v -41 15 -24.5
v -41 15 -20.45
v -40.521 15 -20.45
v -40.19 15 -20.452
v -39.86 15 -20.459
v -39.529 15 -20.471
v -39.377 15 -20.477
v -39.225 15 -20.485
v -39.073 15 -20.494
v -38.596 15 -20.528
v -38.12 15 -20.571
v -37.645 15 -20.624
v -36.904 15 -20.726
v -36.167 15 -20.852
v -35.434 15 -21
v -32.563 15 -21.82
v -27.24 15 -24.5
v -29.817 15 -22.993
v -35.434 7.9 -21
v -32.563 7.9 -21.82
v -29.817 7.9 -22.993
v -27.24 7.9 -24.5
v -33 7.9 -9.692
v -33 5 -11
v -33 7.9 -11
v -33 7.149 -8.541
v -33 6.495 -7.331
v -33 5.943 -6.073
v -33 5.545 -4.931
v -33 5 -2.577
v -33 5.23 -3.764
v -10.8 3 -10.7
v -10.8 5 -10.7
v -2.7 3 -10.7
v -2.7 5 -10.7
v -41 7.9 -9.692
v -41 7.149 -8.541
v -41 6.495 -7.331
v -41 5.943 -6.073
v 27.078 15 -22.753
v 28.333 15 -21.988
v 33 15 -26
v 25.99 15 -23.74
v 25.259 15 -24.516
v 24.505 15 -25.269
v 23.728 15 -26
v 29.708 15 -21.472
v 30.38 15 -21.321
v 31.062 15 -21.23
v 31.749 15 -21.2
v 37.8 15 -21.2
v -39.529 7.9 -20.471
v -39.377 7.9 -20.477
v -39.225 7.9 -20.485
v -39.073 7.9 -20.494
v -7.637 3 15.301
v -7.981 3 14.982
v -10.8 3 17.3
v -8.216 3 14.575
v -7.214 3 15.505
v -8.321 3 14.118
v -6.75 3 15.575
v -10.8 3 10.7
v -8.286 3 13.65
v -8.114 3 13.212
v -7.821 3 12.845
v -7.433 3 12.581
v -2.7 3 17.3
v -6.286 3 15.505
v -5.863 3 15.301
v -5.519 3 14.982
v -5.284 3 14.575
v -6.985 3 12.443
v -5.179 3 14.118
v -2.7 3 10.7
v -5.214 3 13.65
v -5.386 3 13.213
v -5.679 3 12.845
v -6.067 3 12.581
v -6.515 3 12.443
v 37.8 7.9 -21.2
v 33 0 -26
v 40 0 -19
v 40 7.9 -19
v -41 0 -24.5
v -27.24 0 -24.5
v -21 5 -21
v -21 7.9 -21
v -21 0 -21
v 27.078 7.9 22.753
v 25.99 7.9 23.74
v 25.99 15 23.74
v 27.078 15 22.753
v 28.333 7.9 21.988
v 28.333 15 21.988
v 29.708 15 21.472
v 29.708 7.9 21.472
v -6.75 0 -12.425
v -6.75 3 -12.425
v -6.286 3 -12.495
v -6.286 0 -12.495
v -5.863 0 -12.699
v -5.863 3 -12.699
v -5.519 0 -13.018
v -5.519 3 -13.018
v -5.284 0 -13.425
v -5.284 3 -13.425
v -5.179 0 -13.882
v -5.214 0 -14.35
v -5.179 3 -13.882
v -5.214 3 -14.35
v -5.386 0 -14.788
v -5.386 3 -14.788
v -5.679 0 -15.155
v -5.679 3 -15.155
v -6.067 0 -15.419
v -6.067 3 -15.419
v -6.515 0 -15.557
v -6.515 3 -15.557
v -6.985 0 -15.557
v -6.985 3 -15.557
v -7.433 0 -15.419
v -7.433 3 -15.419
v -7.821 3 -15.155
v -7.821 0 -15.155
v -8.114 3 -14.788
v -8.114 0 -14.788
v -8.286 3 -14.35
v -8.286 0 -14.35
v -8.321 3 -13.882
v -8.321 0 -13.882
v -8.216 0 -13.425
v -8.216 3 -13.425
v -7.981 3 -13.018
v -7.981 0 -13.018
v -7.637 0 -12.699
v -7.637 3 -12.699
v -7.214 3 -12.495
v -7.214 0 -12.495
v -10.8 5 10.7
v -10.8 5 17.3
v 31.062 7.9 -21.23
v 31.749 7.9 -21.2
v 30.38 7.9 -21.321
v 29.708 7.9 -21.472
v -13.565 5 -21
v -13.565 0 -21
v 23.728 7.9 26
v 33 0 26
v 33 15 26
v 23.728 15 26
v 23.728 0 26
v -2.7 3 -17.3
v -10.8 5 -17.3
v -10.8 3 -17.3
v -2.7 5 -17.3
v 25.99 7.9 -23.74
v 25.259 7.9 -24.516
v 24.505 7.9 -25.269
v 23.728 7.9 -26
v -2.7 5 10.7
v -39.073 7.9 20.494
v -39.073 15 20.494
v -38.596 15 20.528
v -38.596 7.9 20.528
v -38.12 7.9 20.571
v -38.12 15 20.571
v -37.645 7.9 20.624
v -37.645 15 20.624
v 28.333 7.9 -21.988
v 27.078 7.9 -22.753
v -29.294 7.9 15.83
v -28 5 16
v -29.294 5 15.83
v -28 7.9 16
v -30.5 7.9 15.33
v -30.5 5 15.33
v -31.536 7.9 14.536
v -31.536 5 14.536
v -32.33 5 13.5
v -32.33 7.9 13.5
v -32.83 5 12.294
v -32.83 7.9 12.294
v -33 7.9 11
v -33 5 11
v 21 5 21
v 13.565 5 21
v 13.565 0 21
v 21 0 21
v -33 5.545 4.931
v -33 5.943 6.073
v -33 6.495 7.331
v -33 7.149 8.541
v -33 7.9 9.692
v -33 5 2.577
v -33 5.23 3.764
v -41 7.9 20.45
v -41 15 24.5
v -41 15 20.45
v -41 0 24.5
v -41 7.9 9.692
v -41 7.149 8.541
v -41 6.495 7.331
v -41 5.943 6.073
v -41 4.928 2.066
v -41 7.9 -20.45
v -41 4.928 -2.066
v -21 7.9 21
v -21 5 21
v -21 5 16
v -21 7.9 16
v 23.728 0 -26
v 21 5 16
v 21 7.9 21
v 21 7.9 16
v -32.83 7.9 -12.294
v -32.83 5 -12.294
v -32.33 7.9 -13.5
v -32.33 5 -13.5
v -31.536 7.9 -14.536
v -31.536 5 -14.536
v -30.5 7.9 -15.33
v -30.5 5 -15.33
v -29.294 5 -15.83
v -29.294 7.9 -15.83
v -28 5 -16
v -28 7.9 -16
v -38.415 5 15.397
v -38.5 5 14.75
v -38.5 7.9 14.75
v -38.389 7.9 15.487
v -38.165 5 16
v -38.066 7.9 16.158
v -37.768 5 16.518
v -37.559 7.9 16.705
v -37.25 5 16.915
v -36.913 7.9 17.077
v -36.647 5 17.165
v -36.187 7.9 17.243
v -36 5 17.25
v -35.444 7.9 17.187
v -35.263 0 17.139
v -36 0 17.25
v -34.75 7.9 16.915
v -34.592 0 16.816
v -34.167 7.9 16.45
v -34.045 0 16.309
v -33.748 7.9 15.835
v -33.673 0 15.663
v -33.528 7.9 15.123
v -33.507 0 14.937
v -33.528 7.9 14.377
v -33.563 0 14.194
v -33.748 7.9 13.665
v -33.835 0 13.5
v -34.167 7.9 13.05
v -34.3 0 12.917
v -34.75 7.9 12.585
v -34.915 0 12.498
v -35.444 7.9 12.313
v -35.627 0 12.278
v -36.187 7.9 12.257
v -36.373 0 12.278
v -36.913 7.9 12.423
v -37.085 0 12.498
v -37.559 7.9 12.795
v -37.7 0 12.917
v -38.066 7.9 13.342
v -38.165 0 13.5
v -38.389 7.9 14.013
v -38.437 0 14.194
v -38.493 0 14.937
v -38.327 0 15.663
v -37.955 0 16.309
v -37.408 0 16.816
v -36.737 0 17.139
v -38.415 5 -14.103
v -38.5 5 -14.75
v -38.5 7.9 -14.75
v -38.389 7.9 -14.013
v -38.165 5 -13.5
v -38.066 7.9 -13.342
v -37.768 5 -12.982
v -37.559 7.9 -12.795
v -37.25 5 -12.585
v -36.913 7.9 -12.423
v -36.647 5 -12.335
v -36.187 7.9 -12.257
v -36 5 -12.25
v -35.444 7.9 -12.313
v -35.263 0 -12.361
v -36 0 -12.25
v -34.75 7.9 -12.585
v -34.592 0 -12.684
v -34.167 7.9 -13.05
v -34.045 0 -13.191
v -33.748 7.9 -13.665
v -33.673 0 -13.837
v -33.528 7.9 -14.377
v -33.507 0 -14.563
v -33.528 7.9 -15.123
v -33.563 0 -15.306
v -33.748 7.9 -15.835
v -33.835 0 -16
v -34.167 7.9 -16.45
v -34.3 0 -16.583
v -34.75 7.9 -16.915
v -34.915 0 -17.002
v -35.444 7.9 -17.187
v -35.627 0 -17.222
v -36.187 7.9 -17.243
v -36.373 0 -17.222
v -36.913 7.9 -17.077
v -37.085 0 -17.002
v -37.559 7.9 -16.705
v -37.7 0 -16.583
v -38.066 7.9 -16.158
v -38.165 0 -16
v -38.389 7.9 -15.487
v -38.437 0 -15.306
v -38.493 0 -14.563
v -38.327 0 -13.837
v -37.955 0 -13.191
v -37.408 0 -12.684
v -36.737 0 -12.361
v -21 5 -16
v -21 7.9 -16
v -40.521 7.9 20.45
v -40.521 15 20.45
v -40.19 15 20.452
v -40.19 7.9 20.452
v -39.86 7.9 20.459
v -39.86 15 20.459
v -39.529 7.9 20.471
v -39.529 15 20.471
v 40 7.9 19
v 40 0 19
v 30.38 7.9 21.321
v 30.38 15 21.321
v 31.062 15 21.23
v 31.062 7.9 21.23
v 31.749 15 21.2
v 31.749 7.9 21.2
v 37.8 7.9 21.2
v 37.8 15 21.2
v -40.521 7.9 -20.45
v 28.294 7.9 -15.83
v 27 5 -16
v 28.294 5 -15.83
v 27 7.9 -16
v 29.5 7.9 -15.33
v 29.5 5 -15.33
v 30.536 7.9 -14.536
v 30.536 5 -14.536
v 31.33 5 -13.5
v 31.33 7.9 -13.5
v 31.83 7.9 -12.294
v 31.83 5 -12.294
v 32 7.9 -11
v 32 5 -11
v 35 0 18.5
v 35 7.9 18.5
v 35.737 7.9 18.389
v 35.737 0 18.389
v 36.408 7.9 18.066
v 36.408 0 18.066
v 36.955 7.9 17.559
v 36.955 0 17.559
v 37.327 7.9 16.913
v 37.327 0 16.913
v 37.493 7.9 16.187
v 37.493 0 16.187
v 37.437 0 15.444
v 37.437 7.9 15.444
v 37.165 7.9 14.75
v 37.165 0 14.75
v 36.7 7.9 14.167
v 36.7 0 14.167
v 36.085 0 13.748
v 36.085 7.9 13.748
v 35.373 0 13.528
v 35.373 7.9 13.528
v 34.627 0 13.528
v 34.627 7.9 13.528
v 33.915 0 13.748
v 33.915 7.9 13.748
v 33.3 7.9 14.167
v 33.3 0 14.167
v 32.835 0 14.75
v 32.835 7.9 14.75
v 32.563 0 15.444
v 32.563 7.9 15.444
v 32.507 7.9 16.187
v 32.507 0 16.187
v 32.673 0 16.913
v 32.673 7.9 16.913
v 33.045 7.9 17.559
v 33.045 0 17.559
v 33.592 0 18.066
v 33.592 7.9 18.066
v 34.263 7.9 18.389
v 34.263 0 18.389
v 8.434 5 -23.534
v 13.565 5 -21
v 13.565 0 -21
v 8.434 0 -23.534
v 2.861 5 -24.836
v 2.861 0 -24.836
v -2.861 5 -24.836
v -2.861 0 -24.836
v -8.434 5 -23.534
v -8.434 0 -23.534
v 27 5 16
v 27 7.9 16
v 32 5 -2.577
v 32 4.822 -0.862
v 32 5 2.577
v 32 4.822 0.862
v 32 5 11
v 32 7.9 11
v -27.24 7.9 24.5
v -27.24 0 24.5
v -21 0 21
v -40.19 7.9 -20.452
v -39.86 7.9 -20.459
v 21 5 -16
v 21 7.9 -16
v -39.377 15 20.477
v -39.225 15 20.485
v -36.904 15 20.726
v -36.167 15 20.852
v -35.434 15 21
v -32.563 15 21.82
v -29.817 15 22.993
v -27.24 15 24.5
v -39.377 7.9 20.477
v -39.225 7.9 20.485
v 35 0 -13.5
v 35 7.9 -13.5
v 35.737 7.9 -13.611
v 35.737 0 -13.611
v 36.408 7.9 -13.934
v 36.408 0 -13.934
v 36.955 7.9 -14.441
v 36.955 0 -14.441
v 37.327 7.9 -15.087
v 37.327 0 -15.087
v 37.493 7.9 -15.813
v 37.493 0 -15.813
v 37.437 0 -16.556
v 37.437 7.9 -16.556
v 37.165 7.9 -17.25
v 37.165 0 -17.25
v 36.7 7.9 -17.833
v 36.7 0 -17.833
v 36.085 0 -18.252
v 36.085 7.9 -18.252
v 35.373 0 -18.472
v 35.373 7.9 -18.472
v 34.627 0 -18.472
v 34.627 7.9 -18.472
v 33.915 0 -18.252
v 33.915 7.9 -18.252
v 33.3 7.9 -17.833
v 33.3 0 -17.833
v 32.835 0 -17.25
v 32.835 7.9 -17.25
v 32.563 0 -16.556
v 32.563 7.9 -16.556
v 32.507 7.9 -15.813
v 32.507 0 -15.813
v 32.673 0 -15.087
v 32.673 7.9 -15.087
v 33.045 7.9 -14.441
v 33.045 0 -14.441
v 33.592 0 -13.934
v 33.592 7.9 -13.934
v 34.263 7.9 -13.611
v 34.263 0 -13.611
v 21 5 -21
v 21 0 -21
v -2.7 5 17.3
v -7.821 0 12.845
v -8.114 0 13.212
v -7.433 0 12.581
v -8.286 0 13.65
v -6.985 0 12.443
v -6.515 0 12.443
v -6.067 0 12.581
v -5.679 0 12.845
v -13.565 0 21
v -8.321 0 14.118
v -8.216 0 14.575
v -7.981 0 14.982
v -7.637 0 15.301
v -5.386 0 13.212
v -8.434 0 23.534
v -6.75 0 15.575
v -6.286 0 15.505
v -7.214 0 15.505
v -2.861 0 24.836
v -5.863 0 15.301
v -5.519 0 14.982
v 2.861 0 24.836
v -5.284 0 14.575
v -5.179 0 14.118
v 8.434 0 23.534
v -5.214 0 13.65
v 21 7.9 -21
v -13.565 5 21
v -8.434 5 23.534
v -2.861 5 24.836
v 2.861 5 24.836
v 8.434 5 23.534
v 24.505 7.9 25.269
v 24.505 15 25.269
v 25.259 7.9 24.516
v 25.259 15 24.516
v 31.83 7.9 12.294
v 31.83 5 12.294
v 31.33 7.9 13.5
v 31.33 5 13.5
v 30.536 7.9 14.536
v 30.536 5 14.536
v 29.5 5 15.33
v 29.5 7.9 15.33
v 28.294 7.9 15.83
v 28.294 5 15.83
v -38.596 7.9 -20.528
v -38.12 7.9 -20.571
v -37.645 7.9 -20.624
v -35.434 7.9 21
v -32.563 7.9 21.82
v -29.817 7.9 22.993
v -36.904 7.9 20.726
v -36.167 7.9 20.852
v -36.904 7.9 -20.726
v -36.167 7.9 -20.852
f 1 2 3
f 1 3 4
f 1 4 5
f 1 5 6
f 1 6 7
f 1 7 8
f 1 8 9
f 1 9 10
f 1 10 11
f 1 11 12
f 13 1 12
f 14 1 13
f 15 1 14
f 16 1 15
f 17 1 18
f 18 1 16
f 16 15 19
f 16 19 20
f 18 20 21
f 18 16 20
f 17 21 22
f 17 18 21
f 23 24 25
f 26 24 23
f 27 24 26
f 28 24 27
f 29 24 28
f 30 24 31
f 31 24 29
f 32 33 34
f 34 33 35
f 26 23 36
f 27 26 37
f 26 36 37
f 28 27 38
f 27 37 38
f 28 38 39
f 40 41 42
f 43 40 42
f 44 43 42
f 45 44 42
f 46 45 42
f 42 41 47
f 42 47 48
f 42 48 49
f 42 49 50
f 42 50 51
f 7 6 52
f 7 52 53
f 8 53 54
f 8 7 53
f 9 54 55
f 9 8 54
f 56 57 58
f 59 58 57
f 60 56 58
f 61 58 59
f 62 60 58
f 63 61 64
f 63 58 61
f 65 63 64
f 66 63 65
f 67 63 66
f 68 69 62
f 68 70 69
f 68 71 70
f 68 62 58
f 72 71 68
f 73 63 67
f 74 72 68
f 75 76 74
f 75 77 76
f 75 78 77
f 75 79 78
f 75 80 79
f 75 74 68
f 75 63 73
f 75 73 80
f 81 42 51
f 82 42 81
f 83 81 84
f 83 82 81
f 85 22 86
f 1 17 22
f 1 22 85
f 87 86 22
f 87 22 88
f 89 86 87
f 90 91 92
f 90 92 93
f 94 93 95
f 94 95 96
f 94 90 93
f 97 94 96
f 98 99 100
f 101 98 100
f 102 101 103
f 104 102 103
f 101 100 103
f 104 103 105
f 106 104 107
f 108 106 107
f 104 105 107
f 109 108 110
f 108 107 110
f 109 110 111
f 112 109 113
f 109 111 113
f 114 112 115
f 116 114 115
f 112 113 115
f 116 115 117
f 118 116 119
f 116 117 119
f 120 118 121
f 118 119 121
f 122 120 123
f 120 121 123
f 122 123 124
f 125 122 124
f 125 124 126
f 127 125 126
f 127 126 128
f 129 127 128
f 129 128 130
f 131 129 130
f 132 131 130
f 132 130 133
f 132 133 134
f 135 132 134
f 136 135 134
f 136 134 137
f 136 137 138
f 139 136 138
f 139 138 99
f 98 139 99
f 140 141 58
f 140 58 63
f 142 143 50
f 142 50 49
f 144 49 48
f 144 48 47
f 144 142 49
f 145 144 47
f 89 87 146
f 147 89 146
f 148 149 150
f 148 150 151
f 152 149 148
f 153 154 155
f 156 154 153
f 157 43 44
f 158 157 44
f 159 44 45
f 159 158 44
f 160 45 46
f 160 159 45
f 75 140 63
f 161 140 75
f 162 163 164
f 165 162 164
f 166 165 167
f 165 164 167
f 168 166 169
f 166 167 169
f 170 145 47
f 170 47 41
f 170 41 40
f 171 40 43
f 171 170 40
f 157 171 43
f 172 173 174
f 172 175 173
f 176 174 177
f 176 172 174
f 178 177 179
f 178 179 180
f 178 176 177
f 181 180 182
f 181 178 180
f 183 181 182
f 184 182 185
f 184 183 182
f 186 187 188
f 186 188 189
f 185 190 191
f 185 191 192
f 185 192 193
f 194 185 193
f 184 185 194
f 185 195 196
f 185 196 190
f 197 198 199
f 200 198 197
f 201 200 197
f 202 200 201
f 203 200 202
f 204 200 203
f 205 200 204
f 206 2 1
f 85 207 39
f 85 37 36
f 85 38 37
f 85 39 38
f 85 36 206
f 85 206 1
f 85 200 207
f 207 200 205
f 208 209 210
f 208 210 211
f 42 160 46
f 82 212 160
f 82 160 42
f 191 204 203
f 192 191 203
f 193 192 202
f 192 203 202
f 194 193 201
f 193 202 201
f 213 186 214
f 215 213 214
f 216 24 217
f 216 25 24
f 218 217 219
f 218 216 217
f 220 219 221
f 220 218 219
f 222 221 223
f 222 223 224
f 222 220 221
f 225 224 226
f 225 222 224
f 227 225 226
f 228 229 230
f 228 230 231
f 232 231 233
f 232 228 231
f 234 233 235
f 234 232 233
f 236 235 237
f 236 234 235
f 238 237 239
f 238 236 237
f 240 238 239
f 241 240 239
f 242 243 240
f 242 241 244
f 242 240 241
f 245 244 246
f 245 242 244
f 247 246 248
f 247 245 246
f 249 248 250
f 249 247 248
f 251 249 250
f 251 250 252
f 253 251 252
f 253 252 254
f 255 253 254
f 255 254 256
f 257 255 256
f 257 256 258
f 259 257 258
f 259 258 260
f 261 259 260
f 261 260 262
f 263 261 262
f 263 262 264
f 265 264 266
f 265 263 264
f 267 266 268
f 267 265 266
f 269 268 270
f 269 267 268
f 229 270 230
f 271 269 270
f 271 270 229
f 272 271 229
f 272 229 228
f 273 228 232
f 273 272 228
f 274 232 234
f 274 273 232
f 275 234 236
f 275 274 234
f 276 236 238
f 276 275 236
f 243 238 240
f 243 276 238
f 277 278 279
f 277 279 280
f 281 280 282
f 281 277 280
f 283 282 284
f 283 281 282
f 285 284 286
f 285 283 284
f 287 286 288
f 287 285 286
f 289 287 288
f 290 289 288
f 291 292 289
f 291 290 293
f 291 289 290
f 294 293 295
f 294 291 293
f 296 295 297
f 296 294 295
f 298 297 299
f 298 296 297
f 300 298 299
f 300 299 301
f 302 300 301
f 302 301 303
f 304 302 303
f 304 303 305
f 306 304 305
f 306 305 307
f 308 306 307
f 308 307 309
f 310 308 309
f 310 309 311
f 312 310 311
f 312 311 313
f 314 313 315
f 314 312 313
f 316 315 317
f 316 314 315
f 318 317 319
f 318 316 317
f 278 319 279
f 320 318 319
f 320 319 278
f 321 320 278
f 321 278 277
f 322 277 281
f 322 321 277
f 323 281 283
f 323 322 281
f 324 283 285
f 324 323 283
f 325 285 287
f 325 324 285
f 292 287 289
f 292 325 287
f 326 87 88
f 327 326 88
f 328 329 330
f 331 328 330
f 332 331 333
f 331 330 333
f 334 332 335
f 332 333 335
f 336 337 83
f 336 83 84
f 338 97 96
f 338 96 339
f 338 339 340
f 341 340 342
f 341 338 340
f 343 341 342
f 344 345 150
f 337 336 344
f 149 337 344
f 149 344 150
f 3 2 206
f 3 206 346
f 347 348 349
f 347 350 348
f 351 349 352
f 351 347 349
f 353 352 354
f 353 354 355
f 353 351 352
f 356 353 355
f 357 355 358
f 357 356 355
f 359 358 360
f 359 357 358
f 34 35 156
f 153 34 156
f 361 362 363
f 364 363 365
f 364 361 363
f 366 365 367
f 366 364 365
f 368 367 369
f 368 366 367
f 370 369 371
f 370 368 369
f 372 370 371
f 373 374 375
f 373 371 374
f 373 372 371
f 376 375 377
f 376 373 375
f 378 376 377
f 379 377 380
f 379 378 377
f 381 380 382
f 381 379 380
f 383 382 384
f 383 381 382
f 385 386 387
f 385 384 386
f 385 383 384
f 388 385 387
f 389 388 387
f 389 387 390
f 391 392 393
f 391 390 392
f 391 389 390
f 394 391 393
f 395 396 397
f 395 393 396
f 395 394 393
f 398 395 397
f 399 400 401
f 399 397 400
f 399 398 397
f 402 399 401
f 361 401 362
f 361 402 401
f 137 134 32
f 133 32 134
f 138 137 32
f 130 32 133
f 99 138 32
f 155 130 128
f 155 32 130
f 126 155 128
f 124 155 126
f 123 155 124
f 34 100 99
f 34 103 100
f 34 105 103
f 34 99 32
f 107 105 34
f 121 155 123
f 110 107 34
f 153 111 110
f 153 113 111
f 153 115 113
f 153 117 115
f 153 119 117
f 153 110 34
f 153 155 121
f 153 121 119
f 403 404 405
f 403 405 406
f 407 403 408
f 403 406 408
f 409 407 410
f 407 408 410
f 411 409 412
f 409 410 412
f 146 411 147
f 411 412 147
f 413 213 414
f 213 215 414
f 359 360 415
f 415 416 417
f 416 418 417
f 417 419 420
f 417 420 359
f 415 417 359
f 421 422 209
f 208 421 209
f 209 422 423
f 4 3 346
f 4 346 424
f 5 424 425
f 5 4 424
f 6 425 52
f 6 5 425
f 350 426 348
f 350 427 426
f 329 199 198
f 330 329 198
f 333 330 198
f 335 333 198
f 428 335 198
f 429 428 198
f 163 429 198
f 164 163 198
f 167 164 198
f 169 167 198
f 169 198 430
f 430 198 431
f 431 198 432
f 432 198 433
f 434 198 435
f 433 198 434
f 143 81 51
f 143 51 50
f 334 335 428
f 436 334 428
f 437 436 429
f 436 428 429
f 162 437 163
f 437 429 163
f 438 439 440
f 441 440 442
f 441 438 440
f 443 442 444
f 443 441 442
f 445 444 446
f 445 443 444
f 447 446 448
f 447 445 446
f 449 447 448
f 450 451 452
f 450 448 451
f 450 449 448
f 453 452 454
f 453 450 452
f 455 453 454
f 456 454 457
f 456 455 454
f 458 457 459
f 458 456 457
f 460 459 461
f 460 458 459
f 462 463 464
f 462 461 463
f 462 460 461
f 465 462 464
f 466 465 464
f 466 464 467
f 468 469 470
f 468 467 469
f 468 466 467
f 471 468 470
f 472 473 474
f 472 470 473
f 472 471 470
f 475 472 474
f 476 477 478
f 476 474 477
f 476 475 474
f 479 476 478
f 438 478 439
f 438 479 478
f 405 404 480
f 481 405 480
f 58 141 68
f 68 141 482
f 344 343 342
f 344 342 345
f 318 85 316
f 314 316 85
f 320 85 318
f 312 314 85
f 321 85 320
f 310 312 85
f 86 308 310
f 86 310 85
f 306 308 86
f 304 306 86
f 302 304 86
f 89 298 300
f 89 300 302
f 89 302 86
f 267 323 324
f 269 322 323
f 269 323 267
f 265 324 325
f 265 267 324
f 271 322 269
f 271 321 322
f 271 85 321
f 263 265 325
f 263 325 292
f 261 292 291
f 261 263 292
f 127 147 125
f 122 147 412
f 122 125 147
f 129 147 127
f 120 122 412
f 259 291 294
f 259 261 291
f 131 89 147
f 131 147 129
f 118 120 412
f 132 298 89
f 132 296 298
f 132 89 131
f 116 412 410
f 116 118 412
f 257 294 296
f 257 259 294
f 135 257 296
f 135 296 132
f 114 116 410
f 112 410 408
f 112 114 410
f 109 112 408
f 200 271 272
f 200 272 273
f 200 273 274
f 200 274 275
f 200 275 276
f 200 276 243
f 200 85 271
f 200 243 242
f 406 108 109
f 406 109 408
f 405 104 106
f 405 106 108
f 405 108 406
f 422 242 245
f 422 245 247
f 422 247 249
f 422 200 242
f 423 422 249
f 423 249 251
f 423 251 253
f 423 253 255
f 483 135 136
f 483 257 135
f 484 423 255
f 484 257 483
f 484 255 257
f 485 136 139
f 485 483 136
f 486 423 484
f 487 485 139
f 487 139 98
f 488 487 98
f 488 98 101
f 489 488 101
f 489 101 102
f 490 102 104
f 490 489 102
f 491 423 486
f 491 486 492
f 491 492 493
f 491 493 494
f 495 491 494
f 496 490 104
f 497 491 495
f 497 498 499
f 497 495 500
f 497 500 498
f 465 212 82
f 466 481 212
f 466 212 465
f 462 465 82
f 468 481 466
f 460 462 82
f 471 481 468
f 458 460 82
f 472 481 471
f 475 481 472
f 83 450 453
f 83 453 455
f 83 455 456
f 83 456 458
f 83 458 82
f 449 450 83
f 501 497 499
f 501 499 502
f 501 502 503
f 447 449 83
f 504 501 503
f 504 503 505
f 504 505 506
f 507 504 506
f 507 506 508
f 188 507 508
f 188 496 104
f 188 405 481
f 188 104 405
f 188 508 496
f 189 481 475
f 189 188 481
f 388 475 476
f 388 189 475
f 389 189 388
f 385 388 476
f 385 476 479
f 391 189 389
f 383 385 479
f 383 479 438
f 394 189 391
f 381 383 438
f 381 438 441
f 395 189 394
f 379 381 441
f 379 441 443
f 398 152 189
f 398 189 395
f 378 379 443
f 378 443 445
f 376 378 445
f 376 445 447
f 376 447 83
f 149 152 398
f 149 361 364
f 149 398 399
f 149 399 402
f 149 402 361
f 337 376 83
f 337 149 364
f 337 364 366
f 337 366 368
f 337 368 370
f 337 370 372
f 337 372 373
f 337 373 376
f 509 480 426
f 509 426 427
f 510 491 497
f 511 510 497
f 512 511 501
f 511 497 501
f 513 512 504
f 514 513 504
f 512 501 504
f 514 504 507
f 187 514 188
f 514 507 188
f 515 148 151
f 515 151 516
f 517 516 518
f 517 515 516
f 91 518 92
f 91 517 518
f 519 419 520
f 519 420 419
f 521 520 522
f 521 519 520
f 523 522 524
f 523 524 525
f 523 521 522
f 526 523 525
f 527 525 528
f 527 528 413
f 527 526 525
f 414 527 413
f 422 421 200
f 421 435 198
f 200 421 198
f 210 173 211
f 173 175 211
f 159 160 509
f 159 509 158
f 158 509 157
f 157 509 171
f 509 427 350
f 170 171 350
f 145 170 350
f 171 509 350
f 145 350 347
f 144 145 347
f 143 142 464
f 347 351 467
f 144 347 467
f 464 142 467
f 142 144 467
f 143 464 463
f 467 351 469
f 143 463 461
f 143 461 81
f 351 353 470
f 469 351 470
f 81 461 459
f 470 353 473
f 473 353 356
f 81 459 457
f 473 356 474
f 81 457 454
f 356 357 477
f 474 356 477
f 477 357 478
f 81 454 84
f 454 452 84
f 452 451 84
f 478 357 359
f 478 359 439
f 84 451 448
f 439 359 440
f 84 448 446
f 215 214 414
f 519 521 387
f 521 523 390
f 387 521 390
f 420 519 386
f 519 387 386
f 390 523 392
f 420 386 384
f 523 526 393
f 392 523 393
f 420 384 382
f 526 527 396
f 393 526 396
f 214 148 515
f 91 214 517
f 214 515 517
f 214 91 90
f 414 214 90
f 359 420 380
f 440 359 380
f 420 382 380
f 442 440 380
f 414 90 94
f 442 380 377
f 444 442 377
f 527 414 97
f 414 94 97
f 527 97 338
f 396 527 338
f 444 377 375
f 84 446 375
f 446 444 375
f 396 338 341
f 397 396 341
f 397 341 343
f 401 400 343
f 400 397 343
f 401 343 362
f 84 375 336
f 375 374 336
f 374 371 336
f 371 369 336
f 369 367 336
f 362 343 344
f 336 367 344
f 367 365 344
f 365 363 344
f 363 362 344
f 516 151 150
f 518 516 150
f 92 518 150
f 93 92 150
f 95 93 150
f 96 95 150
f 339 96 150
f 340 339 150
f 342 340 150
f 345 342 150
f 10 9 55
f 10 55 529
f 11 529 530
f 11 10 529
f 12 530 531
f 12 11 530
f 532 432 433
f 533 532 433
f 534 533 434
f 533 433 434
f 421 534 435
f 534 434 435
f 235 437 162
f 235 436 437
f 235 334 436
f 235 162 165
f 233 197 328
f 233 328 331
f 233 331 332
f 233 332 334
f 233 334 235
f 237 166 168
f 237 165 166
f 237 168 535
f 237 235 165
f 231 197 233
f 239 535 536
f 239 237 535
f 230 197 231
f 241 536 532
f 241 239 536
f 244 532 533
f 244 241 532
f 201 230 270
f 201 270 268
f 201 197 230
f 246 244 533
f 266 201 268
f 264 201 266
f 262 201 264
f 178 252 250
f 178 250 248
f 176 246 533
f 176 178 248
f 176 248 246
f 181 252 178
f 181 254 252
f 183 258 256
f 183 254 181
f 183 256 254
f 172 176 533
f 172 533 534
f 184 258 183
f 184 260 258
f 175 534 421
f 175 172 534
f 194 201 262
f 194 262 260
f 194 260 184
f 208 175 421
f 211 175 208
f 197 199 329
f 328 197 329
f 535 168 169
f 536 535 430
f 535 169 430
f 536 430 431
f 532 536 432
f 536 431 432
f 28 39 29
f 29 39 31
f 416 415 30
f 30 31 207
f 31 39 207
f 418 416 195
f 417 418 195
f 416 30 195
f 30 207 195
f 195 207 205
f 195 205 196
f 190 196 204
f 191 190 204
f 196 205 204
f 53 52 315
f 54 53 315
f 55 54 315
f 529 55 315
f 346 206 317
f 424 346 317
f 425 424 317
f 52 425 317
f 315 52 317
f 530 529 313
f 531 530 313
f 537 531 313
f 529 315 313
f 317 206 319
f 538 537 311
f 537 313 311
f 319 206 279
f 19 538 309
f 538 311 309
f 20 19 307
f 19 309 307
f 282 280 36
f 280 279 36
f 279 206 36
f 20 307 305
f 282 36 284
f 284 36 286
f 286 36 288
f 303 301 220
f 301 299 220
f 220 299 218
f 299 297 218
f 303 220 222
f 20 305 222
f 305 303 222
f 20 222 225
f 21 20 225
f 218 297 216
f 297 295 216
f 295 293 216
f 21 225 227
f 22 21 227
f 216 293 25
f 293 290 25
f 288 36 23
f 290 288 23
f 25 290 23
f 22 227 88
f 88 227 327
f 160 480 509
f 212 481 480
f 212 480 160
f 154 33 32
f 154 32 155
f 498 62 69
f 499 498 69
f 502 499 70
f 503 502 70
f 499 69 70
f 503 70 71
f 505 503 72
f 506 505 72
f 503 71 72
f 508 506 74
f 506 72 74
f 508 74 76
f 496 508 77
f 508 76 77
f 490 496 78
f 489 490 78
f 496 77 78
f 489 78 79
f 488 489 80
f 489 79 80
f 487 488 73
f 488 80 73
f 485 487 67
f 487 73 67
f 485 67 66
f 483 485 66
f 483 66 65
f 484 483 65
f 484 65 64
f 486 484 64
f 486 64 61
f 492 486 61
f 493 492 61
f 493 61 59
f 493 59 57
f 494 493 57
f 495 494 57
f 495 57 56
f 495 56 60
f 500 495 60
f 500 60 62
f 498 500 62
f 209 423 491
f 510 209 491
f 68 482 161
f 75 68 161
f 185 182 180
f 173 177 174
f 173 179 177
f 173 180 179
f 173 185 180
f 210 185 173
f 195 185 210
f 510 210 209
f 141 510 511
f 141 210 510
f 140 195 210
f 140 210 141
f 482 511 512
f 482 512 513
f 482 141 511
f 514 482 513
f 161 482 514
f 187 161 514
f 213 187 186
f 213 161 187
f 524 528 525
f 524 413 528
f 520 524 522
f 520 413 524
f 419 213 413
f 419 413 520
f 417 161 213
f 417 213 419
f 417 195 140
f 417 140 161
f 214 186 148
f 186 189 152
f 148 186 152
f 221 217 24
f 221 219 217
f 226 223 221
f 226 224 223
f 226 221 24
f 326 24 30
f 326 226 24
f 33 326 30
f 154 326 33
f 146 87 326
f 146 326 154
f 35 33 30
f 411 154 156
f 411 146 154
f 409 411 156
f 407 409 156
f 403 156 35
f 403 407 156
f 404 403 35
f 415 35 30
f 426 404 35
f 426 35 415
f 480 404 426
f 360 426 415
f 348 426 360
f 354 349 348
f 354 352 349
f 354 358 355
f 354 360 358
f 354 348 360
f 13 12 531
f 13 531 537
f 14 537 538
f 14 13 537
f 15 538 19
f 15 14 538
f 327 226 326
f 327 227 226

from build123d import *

# Parameters (mm, degrees)
SKETCH_1_R          = 25
SKETCH_1_W          = 81
SKETCH_1_H          = 42
SKETCH_1_R_2        = 2.5
EXTRUDE_1_DEPTH     = 5
SKETCH_3_W          = 8.1
SKETCH_3_H          = 6.6
SKETCH_3_R          = 1.575
CUT_EXTRUDE_1_DEPTH = 2
SKETCH_3_2_R        = 1.575
CUT_EXTRUDE_2_DEPTH = 49.280430818
SKETCH_4_W          = 8
SKETCH_4_H          = 2.9
EXTRUDE_2_DEPTH     = 42
SKETCH_1_3_R        = 2.5
CUT_EXTRUDE_3_DEPTH = 42
EXTRUDE_START       = 21
SKETCH_5_W          = 11
SKETCH_5_H          = 2.9
EXTRUDE_3_DEPTH     = 5
SKETCH_5_W_2        = 12
EXTRUDE_3_2_DEPTH   = 5
CUT_EXTRUDE_4_REACH = 87.138
CHAMFER_1_SIZE      = 2
EXTRUDE_4_DEPTH     = 15
EXTRUDE_4_2_DEPTH   = 15
EXTRUDE_START_2     = -15
EXTRUDE_5_DEPTH     = 7.9
EXTRUDE_6_DEPTH     = 15
EXTRUDE_7_DEPTH     = 7.9
FILLET_1_R          = 5


# Read off the part's stored shape, not the designer's step: 凸台-拉伸7
with BuildPart() as part:
    # 草图1 → 凸台-拉伸1 (new body)
    # profile 1 of 2: a face of its own
    with BuildSketch(Plane(origin=(0, 0, 0), x_dir=(1, 0, 0), z_dir=(0, 1, 0))):
        Circle(SKETCH_1_R)
    # profile 2 of 2: a face of its own
    with BuildSketch(Plane(origin=(0, 0, 0), x_dir=(1, 0, 0), z_dir=(0, 1, 0))):
        with Locations((-0.5, 0)):
            Rectangle(SKETCH_1_W, SKETCH_1_H)
        with Locations(Location((35, 16, 0), (0, 0, 270))):
            Circle(SKETCH_1_R_2, mode=Mode.SUBTRACT)
        with Locations(Location((35, -16, 0), (0, 0, 270))):
            Circle(SKETCH_1_R_2, mode=Mode.SUBTRACT)
        with Locations(Location((-36, 14.75, 0), (0, 0, 270))):
            Circle(SKETCH_1_R_2, mode=Mode.SUBTRACT)
        with Locations(Location((-36, -14.75, 0), (0, 0, 270))):
            Circle(SKETCH_1_R_2, mode=Mode.SUBTRACT)
    extrude(amount=EXTRUDE_1_DEPTH)

    # 草图3 → 切除-拉伸1 (cut)
    # profile 1 of 2: a face of its own
    with BuildSketch(Plane(origin=(0, 5, 0), x_dir=(1, 0, 0), z_dir=(0, 1, 0))):
        with Locations((-6.75, -14)):
            Rectangle(SKETCH_3_W, SKETCH_3_H)
        with Locations(Location((-6.75, -14, 0), (0, 0, 90))):
            Circle(SKETCH_3_R, mode=Mode.SUBTRACT)
    # profile 2 of 2: a face of its own
    with BuildSketch(Plane(origin=(0, 5, 0), x_dir=(1, 0, 0), z_dir=(0, 1, 0))):
        with Locations((-6.75, 14)):
            Rectangle(SKETCH_3_W, SKETCH_3_H)
        with Locations(Location((-6.75, 14, 0), (0, 0, 270))):
            Circle(SKETCH_3_R, mode=Mode.SUBTRACT)
    extrude(amount=-CUT_EXTRUDE_1_DEPTH, mode=Mode.SUBTRACT)

    # 草图3<2> → 切除-拉伸2 (cut, through all)
    with BuildSketch(Plane(origin=(0, 5, 0), x_dir=(1, 0, 0), z_dir=(0, 1, 0))):
        with Locations(Location((-6.75, 14, 0), (0, 0, 270))):
            Circle(SKETCH_3_2_R)
        with Locations(Location((-6.75, -14, 0), (0, 0, 270))):
            Circle(SKETCH_3_2_R)
    extrude(amount=-CUT_EXTRUDE_2_DEPTH, mode=Mode.SUBTRACT)

    # 草图4 → 凸台-拉伸2 (add)
    with BuildSketch(Plane.XY.offset(21)):
        with Locations((36, 6.45)):
            Rectangle(SKETCH_4_W, SKETCH_4_H)
        with Locations((-37, 6.45)):
            Rectangle(SKETCH_4_W, SKETCH_4_H)
    extrude(amount=-EXTRUDE_2_DEPTH)

    # 草图1<3> → 切除-拉伸3 (cut)
    with BuildSketch(Plane(origin=(0, 0, 0), x_dir=(1, 0, 0), z_dir=(0, 1, 0))):
        with Locations(Location((35, 16, 0), (0, 0, 270))):
            Circle(SKETCH_1_3_R)
        with Locations(Location((35, -16, 0), (0, 0, 270))):
            Circle(SKETCH_1_3_R)
        with Locations(Location((-36, 14.75, 0), (0, 0, 180))):
            Circle(SKETCH_1_3_R)
        with Locations(Location((-36, -14.75, 0), (0, 0, 180))):
            Circle(SKETCH_1_3_R)
    extrude(amount=CUT_EXTRUDE_3_DEPTH, mode=Mode.SUBTRACT)


with BuildPart() as body_2:
    # 草图5 → 凸台-拉伸3 (new body)
    with BuildSketch(Plane.XY.offset(EXTRUDE_START)):
        with Locations((26.5, 6.45)):
            Rectangle(SKETCH_5_W, SKETCH_5_H)
    extrude_3 = extrude(amount=-EXTRUDE_3_DEPTH)


with BuildPart() as body_3:
    # 草图5 → Extrude 3 2 (new body)
    with BuildSketch(Plane.XY.offset(EXTRUDE_START)):
        with Locations((-27, 6.45)):
            Rectangle(SKETCH_5_W_2, SKETCH_5_H)
    extrude_3_2 = extrude(amount=-EXTRUDE_3_2_DEPTH)



with BuildPart() as part_1:
    add(part.part)

    # 镜向2: 凸台-拉伸3, Extrude 3 2 across plane
    add(extrude_3.mirror(Plane(origin=(0, 0, 0), x_dir=(1, 0, 0), z_dir=(0, 0, -1))))
    add(extrude_3_2.mirror(Plane(origin=(0, 0, 0), x_dir=(1, 0, 0), z_dir=(0, 0, -1))))

    # 切除-拉伸4: up to this face of the body (flat: up to its plane)
    cut_extrude_4_end = Plane(part_1.part.faces().sort_by_distance((32, 6.45, 2.5))[0])
    # 草图6 → 切除-拉伸4 (cut, up to the picked face)
    with BuildSketch(Plane.ZY.offset(41), mode=Mode.PRIVATE) as cut_extrude_4_sk1:
        with BuildLine():
            Line((11.041960784, 8.971428571), (-11.041960784, 8.971428571))
            ThreePointArc((-11.041960784, 8.971428571), (-8.690257734, 7.239234925), (-6.072727273, 5.943265655))
            ThreePointArc((-6.072727273, 5.943265655), (0, 4.8), (6.072727273, 5.943265655))
            ThreePointArc((6.072727273, 5.943265655), (8.690257734, 7.239234925), (11.041960784, 8.971428571))
        make_face()
    cut_extrude_4_tool1 = split(extrude(cut_extrude_4_sk1.sketch, amount=-CUT_EXTRUDE_4_REACH, mode=Mode.PRIVATE), bisect_by=cut_extrude_4_end, keep=Keep.BOTH, mode=Mode.PRIVATE)
    add(cut_extrude_4_tool1.solids().sort_by(Axis((-41, 7.283597, 0), (1, 0, 0)))[0], mode=Mode.SUBTRACT)

    # 倒角1
    chamfer_1_edges = [part_1.edges().sort_by_distance(p)[0] for p in [
        (-41, 3.95, 21),
        (-41, 3.95, -21),
        (40, 3.95, -21),
        (40, 3.95, 21),
    ]]
    chamfer(chamfer_1_edges, length=CHAMFER_1_SIZE)



with BuildPart() as body_4:
    # 草图9 → 凸台-拉伸4 (new body)
    with BuildSketch(Plane.XZ):
        with BuildLine():
            Line((33, 26), (23.72846392, 26))
            ThreePointArc((23.72846392, 26), (24.88485791, 24.895458357), (25.989891949, 23.739534884))
            ThreePointArc((25.989891949, 23.739534884), (27.687521221, 22.340851231), (29.708138181, 21.471732017))
            ThreePointArc((29.708138181, 21.471732017), (30.719571772, 21.268231436), (31.749015733, 21.2))
            Line((31.749015733, 21.2), (37.8, 21.2))
            Line((37.8, 21.2), (33, 26))
        make_face()
    extrude(amount=-EXTRUDE_4_DEPTH)


with BuildPart() as body_5:
    # 草图9 → Extrude 4 2 (new body)
    with BuildSketch(Plane.XZ):
        with BuildLine():
            Line((33, -26), (37.8, -21.2))
            Line((37.8, -21.2), (31.749015733, -21.2))
            ThreePointArc((31.749015733, -21.2), (30.719571772, -21.268231436), (29.708138181, -21.471732017))
            ThreePointArc((29.708138181, -21.471732017), (27.687521221, -22.340851231), (25.989891949, -23.739534884))
            ThreePointArc((25.989891949, -23.739534884), (24.88485791, -24.895458357), (23.72846392, -26))
            Line((23.72846392, -26), (33, -26))
        make_face()
    extrude(amount=-EXTRUDE_4_2_DEPTH)


with BuildPart() as part_2:
    add(part_1.part)

    add(body_4.part)  # 凸台-拉伸5 merges body 4
    # 草图10 → 凸台-拉伸5 (add)
    with BuildSketch(Plane(origin=(0, 15, 0), x_dir=(1, 0, 0), z_dir=(0, 1, 0)).offset(EXTRUDE_START_2)):
        with BuildLine():
            Line((21, -21), (23.72846392, -26))
            ThreePointArc((23.72846392, -26), (24.88485791, -24.895458357), (25.989891949, -23.739534884))
            ThreePointArc((25.989891949, -23.739534884), (28.601924052, -21.863066908), (31.749015733, -21.2))
            Line((31.749015733, -21.2), (37.8, -21.2))
            Line((37.8, -21.2), (38, -21))
            Line((38, -21), (32, -21))
            Line((32, -21), (21, -21))
        make_face()
    extrude_5 = extrude(amount=EXTRUDE_5_DEPTH)


with BuildPart() as body_3_1:
    add(body_3.part)

    add(part_2.part)  # 凸台-拉伸6 merges part
    # 草图11 → 凸台-拉伸6 (add)
    with BuildSketch(Plane.XZ.offset(EXTRUDE_START_2)):
        with BuildLine():
            Line((-41, 23), (-41, 20.45))
            Line((-41, 20.45), (-40.520827978, 20.45))
            ThreePointArc((-40.520827978, 20.45), (-40.024975712, 20.455165886), (-39.5293387, 20.4706613))
            Line((-39.5293387, 20.4706613), (-39, 21))
            Line((-39, 21), (-35.43383476, 21))
            ThreePointArc((-35.43383476, 21), (-31.171725667, 22.363148102), (-27.240108871, 24.5))
            Line((-27.240108871, 24.5), (-41, 24.5))
            Line((-41, 24.5), (-41, 23))
        make_face()
        with BuildLine():
            Line((-39, 21), (-39.5293387, 20.4706613))
            ThreePointArc((-39.5293387, 20.4706613), (-39.301113021, 20.481274846), (-39.072999743, 20.494078772))
            ThreePointArc((-39.072999743, 20.494078772), (-38.358018151, 20.54847571), (-37.644999743, 20.624386527))
            ThreePointArc((-37.644999743, 20.624386527), (-36.534990206, 20.786132091), (-35.43383476, 21))
            Line((-35.43383476, 21), (-39, 21))
        make_face()
    extrude_6 = extrude(amount=EXTRUDE_6_DEPTH)

    # 凸台-拉伸7 outline → 凸台-拉伸7 (add)
    with BuildSketch(Plane(origin=(0, 0, 0), x_dir=(1, 0, 0), z_dir=(0, 1, 0))):
        with BuildLine():
            Line((-39.5293387, -20.4706613), (-41, -19))
            Line((-41, -19), (-41, -20.45))
            Line((-41, -20.45), (-40.520827978, -20.45))
            ThreePointArc((-40.520827978, -20.45), (-40.024975712, -20.455165886), (-39.5293387, -20.4706613))
        make_face()
        with BuildLine():
            Line((-21, -21), (-35.43383476, -21))
            ThreePointArc((-35.43383476, -21), (-31.171725667, -22.363148102), (-27.240108871, -24.5))
            Line((-27.240108871, -24.5), (-21, -21))
        make_face()
    extrude_7 = extrude(amount=EXTRUDE_7_DEPTH)

    # 镜向3: 凸台-拉伸5, 凸台-拉伸6, 凸台-拉伸7 across plane
    add(extrude_5.mirror(Plane(origin=(0, 0, 0), x_dir=(1, 0, 0), z_dir=(0, 0, -1))))
    add(extrude_6.mirror(Plane(origin=(0, 0, 0), x_dir=(1, 0, 0), z_dir=(0, 0, -1))))
    add(extrude_7.mirror(Plane(origin=(0, 0, 0), x_dir=(1, 0, 0), z_dir=(0, 0, -1))))


with BuildPart() as body_2_1:
    add(body_2.part)

    # Combine 1: union body 3, body 5
    add(body_3_1.part)
    add(body_5.part)

    # 圆角1
    fillet_1_edges = [body_2_1.edges().sort_by_distance(p)[0] for p in [
        (32, 6.45, 16),
        (-33, 6.45, 16),
        (-33, 6.45, -16),
        (32, 6.45, -16),
    ]]
    fillet(fillet_1_edges, radius=FILLET_1_R)


solid = body_2_1.part
